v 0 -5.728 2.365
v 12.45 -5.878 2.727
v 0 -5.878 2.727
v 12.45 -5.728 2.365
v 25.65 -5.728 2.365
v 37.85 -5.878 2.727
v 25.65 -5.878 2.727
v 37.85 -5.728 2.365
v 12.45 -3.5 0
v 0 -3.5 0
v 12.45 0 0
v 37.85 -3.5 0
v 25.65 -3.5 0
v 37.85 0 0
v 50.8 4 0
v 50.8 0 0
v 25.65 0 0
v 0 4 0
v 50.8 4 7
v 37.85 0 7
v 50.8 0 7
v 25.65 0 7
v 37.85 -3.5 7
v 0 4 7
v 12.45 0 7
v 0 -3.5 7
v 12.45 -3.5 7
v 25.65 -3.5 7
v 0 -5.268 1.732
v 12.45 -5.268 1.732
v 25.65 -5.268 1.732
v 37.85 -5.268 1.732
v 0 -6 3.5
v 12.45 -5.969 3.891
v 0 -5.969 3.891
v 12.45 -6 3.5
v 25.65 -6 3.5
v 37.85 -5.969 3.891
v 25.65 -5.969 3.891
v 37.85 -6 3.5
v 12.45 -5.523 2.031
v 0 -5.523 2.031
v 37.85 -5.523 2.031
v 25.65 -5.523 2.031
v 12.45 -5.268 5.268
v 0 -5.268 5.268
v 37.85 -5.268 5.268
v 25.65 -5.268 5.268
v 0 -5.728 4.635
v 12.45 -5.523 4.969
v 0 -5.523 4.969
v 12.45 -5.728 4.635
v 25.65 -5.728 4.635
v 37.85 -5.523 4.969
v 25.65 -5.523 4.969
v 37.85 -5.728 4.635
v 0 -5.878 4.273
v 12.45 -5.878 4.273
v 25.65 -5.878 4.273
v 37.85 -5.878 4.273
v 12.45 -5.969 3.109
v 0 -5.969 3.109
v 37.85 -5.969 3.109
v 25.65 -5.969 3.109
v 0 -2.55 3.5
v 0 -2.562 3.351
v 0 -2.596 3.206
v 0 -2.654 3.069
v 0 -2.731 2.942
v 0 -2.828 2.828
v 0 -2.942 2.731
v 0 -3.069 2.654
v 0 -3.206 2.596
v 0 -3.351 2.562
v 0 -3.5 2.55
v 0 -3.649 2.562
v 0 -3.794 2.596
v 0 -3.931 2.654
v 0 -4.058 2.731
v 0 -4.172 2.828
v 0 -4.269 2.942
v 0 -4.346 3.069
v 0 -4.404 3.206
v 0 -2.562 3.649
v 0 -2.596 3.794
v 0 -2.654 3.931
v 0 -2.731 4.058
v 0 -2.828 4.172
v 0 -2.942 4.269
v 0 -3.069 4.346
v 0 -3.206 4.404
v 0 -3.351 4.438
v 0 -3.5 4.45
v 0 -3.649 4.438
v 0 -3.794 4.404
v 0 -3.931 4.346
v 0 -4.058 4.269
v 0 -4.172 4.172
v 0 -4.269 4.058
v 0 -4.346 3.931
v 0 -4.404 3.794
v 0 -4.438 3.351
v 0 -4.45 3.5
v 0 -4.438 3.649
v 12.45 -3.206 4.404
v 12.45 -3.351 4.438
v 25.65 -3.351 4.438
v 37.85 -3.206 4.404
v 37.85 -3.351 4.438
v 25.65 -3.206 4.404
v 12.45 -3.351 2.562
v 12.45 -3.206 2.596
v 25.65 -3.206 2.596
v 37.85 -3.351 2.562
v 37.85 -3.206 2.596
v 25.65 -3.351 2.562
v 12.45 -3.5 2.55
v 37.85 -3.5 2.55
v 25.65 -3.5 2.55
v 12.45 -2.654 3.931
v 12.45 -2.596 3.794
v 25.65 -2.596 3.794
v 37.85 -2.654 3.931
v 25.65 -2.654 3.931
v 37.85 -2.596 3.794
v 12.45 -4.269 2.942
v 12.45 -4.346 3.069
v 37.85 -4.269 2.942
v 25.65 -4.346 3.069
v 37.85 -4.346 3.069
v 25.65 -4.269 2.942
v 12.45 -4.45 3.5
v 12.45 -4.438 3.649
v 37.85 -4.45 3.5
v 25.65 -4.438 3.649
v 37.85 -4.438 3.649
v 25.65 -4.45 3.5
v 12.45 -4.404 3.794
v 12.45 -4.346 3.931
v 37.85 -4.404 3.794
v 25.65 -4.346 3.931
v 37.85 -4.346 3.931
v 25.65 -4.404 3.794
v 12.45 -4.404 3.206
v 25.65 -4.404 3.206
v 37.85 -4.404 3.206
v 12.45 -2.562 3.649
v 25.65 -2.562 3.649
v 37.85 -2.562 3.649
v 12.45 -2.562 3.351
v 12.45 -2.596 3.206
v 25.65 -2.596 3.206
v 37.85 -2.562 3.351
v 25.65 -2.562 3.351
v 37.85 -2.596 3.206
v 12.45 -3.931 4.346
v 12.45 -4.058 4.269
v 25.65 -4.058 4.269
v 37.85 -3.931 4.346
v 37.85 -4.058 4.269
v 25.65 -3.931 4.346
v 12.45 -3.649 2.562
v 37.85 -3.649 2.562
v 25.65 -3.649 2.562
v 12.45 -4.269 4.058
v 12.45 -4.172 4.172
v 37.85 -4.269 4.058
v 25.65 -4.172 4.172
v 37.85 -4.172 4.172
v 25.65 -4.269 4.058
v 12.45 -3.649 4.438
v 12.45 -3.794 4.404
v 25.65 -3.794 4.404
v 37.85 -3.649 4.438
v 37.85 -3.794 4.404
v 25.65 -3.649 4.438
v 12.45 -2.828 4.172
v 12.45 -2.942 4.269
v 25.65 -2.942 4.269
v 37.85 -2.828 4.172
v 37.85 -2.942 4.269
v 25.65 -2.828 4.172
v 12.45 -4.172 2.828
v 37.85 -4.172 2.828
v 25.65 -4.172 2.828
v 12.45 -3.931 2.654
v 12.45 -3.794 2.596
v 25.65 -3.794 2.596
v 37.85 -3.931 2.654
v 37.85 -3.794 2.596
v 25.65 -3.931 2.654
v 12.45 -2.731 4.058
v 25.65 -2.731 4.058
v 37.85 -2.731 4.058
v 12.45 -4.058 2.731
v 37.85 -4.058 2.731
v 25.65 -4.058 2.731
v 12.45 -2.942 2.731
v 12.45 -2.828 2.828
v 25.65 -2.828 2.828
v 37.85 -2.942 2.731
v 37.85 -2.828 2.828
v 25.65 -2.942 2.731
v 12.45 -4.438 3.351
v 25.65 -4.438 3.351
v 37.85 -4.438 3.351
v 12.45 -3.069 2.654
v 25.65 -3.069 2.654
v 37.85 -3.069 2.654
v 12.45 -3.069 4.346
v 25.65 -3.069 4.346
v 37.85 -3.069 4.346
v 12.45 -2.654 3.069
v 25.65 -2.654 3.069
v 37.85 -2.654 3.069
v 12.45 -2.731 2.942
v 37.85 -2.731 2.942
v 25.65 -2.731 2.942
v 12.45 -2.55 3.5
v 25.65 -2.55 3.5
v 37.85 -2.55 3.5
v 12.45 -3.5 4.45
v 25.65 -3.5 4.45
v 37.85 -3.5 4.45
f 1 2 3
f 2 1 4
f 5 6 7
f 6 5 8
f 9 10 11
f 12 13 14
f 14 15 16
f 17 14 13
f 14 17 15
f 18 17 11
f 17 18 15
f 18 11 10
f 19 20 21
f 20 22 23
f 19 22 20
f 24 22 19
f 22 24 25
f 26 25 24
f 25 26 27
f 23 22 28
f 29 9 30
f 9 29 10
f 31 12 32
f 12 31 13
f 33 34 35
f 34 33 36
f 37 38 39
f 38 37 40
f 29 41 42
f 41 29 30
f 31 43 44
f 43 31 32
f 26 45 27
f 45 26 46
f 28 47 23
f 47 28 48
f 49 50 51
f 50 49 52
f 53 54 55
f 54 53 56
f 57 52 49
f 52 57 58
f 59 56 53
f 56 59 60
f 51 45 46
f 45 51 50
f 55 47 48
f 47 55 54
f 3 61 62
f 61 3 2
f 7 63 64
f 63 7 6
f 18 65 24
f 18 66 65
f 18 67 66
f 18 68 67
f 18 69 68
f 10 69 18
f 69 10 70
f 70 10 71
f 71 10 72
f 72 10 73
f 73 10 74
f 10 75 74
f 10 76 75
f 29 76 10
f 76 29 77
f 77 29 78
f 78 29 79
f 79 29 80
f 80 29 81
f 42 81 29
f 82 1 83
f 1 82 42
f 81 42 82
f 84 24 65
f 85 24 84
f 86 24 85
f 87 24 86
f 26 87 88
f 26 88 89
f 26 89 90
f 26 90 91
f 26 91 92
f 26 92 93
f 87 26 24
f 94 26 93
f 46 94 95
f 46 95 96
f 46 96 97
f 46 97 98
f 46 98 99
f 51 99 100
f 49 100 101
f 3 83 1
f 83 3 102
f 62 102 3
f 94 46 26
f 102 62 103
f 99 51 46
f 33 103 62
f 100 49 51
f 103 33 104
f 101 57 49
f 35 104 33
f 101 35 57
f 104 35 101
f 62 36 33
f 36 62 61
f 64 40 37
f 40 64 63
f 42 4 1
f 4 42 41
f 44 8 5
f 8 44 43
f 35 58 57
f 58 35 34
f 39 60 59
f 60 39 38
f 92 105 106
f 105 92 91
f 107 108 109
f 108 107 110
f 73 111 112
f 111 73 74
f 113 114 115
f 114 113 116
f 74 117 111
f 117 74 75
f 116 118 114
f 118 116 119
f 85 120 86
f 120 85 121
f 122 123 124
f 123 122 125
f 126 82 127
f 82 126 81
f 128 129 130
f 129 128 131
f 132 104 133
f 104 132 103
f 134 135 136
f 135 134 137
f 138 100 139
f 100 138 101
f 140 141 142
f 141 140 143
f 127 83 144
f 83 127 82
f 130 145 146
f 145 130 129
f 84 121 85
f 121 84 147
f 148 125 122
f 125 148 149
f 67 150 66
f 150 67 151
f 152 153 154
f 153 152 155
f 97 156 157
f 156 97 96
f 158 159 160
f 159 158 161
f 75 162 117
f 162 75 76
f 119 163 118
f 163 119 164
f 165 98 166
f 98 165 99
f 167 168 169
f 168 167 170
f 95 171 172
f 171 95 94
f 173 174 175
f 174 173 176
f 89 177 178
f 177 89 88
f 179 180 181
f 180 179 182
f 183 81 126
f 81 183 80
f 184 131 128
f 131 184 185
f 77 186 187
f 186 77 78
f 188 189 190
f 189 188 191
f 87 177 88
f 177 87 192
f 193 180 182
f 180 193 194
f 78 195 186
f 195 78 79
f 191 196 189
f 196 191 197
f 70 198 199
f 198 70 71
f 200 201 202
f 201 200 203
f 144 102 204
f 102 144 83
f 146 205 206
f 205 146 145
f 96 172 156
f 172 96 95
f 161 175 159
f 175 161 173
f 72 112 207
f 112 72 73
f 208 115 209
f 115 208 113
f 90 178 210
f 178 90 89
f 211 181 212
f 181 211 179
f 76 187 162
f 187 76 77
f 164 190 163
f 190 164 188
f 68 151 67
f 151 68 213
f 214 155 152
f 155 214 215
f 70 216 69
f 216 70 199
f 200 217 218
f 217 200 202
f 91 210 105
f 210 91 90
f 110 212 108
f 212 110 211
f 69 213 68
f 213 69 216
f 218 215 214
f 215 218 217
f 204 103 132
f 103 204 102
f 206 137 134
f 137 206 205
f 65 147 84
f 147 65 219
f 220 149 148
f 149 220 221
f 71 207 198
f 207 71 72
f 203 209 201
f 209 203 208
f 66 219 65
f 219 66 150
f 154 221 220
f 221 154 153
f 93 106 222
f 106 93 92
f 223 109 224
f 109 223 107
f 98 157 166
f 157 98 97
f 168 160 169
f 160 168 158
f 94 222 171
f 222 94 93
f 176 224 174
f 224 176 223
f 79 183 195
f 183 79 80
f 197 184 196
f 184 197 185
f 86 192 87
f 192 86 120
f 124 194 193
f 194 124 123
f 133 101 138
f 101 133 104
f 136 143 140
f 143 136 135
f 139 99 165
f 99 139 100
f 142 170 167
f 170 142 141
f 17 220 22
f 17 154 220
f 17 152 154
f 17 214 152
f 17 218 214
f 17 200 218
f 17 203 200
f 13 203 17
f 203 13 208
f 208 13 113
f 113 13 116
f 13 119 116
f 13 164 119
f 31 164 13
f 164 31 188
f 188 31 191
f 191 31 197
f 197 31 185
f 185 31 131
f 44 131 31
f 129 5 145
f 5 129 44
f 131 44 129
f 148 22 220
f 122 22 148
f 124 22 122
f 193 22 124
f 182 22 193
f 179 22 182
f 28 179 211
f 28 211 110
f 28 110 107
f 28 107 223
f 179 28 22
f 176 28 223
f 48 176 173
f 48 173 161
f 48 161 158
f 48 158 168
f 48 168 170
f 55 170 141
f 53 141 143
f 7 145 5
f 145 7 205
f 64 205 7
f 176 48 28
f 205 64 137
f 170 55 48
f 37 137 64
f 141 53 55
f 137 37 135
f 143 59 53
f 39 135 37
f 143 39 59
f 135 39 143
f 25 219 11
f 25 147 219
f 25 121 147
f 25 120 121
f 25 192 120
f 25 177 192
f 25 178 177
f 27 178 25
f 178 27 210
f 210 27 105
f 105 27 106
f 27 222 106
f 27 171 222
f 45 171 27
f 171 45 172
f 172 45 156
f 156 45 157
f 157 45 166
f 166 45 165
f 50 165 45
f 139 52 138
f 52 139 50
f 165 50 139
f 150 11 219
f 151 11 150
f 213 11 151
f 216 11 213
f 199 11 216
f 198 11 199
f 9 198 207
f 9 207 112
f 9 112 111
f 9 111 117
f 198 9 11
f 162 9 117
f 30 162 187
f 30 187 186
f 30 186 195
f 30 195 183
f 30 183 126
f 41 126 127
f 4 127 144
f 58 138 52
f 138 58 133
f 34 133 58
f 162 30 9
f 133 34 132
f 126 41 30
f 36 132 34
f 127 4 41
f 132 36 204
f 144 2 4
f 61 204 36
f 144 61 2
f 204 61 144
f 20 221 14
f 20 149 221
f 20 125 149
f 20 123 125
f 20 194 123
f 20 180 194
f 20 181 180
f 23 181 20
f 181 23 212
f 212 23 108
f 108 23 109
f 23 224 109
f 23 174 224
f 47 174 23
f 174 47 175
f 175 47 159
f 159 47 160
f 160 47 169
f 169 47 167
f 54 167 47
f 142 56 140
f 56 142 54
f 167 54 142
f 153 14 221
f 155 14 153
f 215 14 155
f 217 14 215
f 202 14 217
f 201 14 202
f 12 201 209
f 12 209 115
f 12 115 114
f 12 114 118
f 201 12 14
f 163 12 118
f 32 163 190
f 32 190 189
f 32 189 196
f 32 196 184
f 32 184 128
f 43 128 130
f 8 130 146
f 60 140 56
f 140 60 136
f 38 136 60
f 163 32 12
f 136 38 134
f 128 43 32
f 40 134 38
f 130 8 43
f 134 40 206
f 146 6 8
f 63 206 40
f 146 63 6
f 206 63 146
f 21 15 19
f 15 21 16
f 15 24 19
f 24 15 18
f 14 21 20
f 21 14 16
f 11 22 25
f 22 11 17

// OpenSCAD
wid=50.8;
ht=7;
cylDia=5;
holeDia=1.9;

cube([wid,4,ht]);
cylindricalBit();

module cylindricalBit() {
   translate([0,-cylDia/2-1,cylDia/2+(ht-cylDia)/2]) rotate([0,90,0]) {
      difference() {
         union() {
            hull() {
               cylinder($fn=40,d=cylDia,h=wid);
               translate([-cylDia/2-(ht-cylDia)/2,0,0]) cube([cylDia+(ht-cylDia),cylDia/2+2,wid]);
            }
         }
         /* hole through the center */
         translate([0,0,-1]) cylinder($fn=40,d=holeDia,h=wid+2);

         /* cutouts */
         translate([-5,-8,50.8/4-0.25]) cube([20,20,50.8/4+0.5]);
         translate([-5,-8,3*50.8/4-0.25]) cube([20,20,50.8/4+0.5]);
      }
  }
}
